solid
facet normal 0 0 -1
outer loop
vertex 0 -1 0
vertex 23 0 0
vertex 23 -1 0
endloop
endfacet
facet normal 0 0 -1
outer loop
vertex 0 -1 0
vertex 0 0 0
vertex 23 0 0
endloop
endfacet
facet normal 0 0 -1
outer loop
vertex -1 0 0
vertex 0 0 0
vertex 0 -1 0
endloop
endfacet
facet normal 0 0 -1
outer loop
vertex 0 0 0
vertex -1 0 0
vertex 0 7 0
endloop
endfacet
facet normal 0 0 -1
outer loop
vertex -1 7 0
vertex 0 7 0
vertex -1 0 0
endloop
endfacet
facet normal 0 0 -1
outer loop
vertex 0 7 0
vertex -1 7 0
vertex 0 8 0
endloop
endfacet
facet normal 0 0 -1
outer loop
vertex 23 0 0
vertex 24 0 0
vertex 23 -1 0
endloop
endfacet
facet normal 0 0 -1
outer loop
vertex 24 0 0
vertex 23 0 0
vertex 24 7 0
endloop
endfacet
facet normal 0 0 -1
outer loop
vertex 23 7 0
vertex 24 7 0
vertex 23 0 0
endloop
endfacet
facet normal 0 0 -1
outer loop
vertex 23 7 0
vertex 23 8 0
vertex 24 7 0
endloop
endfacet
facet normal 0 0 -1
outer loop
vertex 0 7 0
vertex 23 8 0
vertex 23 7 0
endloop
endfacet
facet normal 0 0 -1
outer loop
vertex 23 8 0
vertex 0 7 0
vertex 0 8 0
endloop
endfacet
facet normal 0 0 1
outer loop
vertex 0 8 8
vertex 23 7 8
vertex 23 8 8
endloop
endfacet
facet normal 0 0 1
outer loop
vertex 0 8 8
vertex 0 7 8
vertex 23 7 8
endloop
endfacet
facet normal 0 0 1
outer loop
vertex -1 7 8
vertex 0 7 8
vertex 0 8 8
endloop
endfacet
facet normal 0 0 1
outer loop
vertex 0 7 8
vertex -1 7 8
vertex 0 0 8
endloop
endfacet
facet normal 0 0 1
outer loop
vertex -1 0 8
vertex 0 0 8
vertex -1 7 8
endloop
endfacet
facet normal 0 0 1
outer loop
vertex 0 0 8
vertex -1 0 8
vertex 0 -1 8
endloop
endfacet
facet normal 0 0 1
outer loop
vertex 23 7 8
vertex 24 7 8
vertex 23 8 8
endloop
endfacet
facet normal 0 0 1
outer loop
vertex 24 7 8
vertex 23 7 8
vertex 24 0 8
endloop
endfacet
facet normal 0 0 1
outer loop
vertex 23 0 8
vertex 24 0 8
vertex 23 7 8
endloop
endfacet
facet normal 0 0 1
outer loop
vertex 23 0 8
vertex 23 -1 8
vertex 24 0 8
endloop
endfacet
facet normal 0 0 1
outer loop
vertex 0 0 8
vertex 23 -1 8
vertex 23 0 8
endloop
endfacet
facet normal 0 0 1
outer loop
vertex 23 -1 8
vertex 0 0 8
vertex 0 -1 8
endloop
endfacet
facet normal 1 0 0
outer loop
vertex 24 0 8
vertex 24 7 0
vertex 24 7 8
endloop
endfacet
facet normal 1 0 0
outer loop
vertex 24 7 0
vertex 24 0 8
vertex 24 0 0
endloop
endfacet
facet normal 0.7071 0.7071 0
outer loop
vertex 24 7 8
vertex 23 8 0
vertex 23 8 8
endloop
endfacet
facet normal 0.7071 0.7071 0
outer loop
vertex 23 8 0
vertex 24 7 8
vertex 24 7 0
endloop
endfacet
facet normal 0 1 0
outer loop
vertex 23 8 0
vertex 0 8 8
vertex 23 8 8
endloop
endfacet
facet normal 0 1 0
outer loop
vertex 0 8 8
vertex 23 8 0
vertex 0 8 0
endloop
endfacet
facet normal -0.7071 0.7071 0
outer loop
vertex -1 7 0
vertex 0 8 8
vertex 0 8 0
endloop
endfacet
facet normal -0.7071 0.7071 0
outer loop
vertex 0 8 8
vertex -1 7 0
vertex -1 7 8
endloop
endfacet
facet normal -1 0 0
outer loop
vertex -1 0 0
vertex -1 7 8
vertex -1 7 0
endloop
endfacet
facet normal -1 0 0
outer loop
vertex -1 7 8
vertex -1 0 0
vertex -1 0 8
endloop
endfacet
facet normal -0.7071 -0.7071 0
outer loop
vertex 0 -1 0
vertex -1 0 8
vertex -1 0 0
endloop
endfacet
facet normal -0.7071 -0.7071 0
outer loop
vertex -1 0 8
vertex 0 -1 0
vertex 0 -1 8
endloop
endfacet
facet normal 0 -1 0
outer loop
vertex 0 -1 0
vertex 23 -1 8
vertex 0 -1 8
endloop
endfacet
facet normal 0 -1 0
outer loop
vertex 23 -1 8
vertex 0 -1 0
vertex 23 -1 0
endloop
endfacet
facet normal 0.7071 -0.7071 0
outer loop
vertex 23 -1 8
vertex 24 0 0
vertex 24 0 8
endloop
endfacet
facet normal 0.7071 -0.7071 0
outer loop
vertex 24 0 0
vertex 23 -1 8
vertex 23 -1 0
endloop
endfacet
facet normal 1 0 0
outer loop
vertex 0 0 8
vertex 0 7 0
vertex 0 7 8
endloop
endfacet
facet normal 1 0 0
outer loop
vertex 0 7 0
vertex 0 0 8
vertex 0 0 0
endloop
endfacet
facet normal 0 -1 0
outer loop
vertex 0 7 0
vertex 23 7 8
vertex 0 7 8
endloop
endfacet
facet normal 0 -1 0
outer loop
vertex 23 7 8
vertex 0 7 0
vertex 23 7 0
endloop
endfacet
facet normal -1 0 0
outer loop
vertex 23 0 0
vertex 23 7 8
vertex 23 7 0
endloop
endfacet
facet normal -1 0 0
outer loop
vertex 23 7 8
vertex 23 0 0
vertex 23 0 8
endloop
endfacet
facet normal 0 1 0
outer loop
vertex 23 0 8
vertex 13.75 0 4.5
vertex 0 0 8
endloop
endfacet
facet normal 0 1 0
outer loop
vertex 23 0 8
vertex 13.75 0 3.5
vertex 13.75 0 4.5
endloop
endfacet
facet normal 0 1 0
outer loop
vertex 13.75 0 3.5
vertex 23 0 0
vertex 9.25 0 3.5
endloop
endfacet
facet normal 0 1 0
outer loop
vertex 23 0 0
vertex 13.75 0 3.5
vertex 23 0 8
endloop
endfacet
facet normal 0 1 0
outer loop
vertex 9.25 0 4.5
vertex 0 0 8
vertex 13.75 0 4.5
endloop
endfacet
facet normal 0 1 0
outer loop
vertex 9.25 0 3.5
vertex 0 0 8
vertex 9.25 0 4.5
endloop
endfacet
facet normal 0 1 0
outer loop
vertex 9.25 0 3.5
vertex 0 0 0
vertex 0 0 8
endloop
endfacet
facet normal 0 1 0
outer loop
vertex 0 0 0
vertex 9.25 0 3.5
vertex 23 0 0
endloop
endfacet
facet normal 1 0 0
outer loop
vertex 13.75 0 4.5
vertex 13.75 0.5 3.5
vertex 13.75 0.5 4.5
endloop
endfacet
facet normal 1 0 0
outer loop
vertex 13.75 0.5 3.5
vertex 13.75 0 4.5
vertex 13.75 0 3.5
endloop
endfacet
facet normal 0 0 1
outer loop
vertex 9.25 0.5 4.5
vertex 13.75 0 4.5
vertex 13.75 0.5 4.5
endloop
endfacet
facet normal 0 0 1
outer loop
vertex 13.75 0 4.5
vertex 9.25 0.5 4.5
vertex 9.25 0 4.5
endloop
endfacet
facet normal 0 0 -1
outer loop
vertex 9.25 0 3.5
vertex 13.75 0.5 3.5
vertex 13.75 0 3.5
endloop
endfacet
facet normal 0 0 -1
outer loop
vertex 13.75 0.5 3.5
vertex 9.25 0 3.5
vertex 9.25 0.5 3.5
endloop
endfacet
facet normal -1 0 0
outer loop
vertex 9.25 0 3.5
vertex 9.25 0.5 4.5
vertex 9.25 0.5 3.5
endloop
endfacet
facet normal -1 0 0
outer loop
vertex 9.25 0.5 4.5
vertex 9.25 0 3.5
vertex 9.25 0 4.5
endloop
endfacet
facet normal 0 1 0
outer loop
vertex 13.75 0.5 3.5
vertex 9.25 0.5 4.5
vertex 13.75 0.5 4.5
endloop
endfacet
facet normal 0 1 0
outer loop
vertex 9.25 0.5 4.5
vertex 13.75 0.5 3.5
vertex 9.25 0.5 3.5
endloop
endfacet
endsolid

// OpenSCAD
thickness = 1;
length = 8;

innerHeight = 7;
innerWidth = 23;

lockWidth = 4.5;
lockThickness = 1;
lockLength = 1;

linear_extrude(length)
difference() {
    offset(thickness)
    square([innerWidth, innerHeight]);
    
    square([innerWidth, innerHeight]);
}

translate([innerWidth / 2, 0, length / 2])
cube([lockWidth, lockLength, lockThickness], center = true);
